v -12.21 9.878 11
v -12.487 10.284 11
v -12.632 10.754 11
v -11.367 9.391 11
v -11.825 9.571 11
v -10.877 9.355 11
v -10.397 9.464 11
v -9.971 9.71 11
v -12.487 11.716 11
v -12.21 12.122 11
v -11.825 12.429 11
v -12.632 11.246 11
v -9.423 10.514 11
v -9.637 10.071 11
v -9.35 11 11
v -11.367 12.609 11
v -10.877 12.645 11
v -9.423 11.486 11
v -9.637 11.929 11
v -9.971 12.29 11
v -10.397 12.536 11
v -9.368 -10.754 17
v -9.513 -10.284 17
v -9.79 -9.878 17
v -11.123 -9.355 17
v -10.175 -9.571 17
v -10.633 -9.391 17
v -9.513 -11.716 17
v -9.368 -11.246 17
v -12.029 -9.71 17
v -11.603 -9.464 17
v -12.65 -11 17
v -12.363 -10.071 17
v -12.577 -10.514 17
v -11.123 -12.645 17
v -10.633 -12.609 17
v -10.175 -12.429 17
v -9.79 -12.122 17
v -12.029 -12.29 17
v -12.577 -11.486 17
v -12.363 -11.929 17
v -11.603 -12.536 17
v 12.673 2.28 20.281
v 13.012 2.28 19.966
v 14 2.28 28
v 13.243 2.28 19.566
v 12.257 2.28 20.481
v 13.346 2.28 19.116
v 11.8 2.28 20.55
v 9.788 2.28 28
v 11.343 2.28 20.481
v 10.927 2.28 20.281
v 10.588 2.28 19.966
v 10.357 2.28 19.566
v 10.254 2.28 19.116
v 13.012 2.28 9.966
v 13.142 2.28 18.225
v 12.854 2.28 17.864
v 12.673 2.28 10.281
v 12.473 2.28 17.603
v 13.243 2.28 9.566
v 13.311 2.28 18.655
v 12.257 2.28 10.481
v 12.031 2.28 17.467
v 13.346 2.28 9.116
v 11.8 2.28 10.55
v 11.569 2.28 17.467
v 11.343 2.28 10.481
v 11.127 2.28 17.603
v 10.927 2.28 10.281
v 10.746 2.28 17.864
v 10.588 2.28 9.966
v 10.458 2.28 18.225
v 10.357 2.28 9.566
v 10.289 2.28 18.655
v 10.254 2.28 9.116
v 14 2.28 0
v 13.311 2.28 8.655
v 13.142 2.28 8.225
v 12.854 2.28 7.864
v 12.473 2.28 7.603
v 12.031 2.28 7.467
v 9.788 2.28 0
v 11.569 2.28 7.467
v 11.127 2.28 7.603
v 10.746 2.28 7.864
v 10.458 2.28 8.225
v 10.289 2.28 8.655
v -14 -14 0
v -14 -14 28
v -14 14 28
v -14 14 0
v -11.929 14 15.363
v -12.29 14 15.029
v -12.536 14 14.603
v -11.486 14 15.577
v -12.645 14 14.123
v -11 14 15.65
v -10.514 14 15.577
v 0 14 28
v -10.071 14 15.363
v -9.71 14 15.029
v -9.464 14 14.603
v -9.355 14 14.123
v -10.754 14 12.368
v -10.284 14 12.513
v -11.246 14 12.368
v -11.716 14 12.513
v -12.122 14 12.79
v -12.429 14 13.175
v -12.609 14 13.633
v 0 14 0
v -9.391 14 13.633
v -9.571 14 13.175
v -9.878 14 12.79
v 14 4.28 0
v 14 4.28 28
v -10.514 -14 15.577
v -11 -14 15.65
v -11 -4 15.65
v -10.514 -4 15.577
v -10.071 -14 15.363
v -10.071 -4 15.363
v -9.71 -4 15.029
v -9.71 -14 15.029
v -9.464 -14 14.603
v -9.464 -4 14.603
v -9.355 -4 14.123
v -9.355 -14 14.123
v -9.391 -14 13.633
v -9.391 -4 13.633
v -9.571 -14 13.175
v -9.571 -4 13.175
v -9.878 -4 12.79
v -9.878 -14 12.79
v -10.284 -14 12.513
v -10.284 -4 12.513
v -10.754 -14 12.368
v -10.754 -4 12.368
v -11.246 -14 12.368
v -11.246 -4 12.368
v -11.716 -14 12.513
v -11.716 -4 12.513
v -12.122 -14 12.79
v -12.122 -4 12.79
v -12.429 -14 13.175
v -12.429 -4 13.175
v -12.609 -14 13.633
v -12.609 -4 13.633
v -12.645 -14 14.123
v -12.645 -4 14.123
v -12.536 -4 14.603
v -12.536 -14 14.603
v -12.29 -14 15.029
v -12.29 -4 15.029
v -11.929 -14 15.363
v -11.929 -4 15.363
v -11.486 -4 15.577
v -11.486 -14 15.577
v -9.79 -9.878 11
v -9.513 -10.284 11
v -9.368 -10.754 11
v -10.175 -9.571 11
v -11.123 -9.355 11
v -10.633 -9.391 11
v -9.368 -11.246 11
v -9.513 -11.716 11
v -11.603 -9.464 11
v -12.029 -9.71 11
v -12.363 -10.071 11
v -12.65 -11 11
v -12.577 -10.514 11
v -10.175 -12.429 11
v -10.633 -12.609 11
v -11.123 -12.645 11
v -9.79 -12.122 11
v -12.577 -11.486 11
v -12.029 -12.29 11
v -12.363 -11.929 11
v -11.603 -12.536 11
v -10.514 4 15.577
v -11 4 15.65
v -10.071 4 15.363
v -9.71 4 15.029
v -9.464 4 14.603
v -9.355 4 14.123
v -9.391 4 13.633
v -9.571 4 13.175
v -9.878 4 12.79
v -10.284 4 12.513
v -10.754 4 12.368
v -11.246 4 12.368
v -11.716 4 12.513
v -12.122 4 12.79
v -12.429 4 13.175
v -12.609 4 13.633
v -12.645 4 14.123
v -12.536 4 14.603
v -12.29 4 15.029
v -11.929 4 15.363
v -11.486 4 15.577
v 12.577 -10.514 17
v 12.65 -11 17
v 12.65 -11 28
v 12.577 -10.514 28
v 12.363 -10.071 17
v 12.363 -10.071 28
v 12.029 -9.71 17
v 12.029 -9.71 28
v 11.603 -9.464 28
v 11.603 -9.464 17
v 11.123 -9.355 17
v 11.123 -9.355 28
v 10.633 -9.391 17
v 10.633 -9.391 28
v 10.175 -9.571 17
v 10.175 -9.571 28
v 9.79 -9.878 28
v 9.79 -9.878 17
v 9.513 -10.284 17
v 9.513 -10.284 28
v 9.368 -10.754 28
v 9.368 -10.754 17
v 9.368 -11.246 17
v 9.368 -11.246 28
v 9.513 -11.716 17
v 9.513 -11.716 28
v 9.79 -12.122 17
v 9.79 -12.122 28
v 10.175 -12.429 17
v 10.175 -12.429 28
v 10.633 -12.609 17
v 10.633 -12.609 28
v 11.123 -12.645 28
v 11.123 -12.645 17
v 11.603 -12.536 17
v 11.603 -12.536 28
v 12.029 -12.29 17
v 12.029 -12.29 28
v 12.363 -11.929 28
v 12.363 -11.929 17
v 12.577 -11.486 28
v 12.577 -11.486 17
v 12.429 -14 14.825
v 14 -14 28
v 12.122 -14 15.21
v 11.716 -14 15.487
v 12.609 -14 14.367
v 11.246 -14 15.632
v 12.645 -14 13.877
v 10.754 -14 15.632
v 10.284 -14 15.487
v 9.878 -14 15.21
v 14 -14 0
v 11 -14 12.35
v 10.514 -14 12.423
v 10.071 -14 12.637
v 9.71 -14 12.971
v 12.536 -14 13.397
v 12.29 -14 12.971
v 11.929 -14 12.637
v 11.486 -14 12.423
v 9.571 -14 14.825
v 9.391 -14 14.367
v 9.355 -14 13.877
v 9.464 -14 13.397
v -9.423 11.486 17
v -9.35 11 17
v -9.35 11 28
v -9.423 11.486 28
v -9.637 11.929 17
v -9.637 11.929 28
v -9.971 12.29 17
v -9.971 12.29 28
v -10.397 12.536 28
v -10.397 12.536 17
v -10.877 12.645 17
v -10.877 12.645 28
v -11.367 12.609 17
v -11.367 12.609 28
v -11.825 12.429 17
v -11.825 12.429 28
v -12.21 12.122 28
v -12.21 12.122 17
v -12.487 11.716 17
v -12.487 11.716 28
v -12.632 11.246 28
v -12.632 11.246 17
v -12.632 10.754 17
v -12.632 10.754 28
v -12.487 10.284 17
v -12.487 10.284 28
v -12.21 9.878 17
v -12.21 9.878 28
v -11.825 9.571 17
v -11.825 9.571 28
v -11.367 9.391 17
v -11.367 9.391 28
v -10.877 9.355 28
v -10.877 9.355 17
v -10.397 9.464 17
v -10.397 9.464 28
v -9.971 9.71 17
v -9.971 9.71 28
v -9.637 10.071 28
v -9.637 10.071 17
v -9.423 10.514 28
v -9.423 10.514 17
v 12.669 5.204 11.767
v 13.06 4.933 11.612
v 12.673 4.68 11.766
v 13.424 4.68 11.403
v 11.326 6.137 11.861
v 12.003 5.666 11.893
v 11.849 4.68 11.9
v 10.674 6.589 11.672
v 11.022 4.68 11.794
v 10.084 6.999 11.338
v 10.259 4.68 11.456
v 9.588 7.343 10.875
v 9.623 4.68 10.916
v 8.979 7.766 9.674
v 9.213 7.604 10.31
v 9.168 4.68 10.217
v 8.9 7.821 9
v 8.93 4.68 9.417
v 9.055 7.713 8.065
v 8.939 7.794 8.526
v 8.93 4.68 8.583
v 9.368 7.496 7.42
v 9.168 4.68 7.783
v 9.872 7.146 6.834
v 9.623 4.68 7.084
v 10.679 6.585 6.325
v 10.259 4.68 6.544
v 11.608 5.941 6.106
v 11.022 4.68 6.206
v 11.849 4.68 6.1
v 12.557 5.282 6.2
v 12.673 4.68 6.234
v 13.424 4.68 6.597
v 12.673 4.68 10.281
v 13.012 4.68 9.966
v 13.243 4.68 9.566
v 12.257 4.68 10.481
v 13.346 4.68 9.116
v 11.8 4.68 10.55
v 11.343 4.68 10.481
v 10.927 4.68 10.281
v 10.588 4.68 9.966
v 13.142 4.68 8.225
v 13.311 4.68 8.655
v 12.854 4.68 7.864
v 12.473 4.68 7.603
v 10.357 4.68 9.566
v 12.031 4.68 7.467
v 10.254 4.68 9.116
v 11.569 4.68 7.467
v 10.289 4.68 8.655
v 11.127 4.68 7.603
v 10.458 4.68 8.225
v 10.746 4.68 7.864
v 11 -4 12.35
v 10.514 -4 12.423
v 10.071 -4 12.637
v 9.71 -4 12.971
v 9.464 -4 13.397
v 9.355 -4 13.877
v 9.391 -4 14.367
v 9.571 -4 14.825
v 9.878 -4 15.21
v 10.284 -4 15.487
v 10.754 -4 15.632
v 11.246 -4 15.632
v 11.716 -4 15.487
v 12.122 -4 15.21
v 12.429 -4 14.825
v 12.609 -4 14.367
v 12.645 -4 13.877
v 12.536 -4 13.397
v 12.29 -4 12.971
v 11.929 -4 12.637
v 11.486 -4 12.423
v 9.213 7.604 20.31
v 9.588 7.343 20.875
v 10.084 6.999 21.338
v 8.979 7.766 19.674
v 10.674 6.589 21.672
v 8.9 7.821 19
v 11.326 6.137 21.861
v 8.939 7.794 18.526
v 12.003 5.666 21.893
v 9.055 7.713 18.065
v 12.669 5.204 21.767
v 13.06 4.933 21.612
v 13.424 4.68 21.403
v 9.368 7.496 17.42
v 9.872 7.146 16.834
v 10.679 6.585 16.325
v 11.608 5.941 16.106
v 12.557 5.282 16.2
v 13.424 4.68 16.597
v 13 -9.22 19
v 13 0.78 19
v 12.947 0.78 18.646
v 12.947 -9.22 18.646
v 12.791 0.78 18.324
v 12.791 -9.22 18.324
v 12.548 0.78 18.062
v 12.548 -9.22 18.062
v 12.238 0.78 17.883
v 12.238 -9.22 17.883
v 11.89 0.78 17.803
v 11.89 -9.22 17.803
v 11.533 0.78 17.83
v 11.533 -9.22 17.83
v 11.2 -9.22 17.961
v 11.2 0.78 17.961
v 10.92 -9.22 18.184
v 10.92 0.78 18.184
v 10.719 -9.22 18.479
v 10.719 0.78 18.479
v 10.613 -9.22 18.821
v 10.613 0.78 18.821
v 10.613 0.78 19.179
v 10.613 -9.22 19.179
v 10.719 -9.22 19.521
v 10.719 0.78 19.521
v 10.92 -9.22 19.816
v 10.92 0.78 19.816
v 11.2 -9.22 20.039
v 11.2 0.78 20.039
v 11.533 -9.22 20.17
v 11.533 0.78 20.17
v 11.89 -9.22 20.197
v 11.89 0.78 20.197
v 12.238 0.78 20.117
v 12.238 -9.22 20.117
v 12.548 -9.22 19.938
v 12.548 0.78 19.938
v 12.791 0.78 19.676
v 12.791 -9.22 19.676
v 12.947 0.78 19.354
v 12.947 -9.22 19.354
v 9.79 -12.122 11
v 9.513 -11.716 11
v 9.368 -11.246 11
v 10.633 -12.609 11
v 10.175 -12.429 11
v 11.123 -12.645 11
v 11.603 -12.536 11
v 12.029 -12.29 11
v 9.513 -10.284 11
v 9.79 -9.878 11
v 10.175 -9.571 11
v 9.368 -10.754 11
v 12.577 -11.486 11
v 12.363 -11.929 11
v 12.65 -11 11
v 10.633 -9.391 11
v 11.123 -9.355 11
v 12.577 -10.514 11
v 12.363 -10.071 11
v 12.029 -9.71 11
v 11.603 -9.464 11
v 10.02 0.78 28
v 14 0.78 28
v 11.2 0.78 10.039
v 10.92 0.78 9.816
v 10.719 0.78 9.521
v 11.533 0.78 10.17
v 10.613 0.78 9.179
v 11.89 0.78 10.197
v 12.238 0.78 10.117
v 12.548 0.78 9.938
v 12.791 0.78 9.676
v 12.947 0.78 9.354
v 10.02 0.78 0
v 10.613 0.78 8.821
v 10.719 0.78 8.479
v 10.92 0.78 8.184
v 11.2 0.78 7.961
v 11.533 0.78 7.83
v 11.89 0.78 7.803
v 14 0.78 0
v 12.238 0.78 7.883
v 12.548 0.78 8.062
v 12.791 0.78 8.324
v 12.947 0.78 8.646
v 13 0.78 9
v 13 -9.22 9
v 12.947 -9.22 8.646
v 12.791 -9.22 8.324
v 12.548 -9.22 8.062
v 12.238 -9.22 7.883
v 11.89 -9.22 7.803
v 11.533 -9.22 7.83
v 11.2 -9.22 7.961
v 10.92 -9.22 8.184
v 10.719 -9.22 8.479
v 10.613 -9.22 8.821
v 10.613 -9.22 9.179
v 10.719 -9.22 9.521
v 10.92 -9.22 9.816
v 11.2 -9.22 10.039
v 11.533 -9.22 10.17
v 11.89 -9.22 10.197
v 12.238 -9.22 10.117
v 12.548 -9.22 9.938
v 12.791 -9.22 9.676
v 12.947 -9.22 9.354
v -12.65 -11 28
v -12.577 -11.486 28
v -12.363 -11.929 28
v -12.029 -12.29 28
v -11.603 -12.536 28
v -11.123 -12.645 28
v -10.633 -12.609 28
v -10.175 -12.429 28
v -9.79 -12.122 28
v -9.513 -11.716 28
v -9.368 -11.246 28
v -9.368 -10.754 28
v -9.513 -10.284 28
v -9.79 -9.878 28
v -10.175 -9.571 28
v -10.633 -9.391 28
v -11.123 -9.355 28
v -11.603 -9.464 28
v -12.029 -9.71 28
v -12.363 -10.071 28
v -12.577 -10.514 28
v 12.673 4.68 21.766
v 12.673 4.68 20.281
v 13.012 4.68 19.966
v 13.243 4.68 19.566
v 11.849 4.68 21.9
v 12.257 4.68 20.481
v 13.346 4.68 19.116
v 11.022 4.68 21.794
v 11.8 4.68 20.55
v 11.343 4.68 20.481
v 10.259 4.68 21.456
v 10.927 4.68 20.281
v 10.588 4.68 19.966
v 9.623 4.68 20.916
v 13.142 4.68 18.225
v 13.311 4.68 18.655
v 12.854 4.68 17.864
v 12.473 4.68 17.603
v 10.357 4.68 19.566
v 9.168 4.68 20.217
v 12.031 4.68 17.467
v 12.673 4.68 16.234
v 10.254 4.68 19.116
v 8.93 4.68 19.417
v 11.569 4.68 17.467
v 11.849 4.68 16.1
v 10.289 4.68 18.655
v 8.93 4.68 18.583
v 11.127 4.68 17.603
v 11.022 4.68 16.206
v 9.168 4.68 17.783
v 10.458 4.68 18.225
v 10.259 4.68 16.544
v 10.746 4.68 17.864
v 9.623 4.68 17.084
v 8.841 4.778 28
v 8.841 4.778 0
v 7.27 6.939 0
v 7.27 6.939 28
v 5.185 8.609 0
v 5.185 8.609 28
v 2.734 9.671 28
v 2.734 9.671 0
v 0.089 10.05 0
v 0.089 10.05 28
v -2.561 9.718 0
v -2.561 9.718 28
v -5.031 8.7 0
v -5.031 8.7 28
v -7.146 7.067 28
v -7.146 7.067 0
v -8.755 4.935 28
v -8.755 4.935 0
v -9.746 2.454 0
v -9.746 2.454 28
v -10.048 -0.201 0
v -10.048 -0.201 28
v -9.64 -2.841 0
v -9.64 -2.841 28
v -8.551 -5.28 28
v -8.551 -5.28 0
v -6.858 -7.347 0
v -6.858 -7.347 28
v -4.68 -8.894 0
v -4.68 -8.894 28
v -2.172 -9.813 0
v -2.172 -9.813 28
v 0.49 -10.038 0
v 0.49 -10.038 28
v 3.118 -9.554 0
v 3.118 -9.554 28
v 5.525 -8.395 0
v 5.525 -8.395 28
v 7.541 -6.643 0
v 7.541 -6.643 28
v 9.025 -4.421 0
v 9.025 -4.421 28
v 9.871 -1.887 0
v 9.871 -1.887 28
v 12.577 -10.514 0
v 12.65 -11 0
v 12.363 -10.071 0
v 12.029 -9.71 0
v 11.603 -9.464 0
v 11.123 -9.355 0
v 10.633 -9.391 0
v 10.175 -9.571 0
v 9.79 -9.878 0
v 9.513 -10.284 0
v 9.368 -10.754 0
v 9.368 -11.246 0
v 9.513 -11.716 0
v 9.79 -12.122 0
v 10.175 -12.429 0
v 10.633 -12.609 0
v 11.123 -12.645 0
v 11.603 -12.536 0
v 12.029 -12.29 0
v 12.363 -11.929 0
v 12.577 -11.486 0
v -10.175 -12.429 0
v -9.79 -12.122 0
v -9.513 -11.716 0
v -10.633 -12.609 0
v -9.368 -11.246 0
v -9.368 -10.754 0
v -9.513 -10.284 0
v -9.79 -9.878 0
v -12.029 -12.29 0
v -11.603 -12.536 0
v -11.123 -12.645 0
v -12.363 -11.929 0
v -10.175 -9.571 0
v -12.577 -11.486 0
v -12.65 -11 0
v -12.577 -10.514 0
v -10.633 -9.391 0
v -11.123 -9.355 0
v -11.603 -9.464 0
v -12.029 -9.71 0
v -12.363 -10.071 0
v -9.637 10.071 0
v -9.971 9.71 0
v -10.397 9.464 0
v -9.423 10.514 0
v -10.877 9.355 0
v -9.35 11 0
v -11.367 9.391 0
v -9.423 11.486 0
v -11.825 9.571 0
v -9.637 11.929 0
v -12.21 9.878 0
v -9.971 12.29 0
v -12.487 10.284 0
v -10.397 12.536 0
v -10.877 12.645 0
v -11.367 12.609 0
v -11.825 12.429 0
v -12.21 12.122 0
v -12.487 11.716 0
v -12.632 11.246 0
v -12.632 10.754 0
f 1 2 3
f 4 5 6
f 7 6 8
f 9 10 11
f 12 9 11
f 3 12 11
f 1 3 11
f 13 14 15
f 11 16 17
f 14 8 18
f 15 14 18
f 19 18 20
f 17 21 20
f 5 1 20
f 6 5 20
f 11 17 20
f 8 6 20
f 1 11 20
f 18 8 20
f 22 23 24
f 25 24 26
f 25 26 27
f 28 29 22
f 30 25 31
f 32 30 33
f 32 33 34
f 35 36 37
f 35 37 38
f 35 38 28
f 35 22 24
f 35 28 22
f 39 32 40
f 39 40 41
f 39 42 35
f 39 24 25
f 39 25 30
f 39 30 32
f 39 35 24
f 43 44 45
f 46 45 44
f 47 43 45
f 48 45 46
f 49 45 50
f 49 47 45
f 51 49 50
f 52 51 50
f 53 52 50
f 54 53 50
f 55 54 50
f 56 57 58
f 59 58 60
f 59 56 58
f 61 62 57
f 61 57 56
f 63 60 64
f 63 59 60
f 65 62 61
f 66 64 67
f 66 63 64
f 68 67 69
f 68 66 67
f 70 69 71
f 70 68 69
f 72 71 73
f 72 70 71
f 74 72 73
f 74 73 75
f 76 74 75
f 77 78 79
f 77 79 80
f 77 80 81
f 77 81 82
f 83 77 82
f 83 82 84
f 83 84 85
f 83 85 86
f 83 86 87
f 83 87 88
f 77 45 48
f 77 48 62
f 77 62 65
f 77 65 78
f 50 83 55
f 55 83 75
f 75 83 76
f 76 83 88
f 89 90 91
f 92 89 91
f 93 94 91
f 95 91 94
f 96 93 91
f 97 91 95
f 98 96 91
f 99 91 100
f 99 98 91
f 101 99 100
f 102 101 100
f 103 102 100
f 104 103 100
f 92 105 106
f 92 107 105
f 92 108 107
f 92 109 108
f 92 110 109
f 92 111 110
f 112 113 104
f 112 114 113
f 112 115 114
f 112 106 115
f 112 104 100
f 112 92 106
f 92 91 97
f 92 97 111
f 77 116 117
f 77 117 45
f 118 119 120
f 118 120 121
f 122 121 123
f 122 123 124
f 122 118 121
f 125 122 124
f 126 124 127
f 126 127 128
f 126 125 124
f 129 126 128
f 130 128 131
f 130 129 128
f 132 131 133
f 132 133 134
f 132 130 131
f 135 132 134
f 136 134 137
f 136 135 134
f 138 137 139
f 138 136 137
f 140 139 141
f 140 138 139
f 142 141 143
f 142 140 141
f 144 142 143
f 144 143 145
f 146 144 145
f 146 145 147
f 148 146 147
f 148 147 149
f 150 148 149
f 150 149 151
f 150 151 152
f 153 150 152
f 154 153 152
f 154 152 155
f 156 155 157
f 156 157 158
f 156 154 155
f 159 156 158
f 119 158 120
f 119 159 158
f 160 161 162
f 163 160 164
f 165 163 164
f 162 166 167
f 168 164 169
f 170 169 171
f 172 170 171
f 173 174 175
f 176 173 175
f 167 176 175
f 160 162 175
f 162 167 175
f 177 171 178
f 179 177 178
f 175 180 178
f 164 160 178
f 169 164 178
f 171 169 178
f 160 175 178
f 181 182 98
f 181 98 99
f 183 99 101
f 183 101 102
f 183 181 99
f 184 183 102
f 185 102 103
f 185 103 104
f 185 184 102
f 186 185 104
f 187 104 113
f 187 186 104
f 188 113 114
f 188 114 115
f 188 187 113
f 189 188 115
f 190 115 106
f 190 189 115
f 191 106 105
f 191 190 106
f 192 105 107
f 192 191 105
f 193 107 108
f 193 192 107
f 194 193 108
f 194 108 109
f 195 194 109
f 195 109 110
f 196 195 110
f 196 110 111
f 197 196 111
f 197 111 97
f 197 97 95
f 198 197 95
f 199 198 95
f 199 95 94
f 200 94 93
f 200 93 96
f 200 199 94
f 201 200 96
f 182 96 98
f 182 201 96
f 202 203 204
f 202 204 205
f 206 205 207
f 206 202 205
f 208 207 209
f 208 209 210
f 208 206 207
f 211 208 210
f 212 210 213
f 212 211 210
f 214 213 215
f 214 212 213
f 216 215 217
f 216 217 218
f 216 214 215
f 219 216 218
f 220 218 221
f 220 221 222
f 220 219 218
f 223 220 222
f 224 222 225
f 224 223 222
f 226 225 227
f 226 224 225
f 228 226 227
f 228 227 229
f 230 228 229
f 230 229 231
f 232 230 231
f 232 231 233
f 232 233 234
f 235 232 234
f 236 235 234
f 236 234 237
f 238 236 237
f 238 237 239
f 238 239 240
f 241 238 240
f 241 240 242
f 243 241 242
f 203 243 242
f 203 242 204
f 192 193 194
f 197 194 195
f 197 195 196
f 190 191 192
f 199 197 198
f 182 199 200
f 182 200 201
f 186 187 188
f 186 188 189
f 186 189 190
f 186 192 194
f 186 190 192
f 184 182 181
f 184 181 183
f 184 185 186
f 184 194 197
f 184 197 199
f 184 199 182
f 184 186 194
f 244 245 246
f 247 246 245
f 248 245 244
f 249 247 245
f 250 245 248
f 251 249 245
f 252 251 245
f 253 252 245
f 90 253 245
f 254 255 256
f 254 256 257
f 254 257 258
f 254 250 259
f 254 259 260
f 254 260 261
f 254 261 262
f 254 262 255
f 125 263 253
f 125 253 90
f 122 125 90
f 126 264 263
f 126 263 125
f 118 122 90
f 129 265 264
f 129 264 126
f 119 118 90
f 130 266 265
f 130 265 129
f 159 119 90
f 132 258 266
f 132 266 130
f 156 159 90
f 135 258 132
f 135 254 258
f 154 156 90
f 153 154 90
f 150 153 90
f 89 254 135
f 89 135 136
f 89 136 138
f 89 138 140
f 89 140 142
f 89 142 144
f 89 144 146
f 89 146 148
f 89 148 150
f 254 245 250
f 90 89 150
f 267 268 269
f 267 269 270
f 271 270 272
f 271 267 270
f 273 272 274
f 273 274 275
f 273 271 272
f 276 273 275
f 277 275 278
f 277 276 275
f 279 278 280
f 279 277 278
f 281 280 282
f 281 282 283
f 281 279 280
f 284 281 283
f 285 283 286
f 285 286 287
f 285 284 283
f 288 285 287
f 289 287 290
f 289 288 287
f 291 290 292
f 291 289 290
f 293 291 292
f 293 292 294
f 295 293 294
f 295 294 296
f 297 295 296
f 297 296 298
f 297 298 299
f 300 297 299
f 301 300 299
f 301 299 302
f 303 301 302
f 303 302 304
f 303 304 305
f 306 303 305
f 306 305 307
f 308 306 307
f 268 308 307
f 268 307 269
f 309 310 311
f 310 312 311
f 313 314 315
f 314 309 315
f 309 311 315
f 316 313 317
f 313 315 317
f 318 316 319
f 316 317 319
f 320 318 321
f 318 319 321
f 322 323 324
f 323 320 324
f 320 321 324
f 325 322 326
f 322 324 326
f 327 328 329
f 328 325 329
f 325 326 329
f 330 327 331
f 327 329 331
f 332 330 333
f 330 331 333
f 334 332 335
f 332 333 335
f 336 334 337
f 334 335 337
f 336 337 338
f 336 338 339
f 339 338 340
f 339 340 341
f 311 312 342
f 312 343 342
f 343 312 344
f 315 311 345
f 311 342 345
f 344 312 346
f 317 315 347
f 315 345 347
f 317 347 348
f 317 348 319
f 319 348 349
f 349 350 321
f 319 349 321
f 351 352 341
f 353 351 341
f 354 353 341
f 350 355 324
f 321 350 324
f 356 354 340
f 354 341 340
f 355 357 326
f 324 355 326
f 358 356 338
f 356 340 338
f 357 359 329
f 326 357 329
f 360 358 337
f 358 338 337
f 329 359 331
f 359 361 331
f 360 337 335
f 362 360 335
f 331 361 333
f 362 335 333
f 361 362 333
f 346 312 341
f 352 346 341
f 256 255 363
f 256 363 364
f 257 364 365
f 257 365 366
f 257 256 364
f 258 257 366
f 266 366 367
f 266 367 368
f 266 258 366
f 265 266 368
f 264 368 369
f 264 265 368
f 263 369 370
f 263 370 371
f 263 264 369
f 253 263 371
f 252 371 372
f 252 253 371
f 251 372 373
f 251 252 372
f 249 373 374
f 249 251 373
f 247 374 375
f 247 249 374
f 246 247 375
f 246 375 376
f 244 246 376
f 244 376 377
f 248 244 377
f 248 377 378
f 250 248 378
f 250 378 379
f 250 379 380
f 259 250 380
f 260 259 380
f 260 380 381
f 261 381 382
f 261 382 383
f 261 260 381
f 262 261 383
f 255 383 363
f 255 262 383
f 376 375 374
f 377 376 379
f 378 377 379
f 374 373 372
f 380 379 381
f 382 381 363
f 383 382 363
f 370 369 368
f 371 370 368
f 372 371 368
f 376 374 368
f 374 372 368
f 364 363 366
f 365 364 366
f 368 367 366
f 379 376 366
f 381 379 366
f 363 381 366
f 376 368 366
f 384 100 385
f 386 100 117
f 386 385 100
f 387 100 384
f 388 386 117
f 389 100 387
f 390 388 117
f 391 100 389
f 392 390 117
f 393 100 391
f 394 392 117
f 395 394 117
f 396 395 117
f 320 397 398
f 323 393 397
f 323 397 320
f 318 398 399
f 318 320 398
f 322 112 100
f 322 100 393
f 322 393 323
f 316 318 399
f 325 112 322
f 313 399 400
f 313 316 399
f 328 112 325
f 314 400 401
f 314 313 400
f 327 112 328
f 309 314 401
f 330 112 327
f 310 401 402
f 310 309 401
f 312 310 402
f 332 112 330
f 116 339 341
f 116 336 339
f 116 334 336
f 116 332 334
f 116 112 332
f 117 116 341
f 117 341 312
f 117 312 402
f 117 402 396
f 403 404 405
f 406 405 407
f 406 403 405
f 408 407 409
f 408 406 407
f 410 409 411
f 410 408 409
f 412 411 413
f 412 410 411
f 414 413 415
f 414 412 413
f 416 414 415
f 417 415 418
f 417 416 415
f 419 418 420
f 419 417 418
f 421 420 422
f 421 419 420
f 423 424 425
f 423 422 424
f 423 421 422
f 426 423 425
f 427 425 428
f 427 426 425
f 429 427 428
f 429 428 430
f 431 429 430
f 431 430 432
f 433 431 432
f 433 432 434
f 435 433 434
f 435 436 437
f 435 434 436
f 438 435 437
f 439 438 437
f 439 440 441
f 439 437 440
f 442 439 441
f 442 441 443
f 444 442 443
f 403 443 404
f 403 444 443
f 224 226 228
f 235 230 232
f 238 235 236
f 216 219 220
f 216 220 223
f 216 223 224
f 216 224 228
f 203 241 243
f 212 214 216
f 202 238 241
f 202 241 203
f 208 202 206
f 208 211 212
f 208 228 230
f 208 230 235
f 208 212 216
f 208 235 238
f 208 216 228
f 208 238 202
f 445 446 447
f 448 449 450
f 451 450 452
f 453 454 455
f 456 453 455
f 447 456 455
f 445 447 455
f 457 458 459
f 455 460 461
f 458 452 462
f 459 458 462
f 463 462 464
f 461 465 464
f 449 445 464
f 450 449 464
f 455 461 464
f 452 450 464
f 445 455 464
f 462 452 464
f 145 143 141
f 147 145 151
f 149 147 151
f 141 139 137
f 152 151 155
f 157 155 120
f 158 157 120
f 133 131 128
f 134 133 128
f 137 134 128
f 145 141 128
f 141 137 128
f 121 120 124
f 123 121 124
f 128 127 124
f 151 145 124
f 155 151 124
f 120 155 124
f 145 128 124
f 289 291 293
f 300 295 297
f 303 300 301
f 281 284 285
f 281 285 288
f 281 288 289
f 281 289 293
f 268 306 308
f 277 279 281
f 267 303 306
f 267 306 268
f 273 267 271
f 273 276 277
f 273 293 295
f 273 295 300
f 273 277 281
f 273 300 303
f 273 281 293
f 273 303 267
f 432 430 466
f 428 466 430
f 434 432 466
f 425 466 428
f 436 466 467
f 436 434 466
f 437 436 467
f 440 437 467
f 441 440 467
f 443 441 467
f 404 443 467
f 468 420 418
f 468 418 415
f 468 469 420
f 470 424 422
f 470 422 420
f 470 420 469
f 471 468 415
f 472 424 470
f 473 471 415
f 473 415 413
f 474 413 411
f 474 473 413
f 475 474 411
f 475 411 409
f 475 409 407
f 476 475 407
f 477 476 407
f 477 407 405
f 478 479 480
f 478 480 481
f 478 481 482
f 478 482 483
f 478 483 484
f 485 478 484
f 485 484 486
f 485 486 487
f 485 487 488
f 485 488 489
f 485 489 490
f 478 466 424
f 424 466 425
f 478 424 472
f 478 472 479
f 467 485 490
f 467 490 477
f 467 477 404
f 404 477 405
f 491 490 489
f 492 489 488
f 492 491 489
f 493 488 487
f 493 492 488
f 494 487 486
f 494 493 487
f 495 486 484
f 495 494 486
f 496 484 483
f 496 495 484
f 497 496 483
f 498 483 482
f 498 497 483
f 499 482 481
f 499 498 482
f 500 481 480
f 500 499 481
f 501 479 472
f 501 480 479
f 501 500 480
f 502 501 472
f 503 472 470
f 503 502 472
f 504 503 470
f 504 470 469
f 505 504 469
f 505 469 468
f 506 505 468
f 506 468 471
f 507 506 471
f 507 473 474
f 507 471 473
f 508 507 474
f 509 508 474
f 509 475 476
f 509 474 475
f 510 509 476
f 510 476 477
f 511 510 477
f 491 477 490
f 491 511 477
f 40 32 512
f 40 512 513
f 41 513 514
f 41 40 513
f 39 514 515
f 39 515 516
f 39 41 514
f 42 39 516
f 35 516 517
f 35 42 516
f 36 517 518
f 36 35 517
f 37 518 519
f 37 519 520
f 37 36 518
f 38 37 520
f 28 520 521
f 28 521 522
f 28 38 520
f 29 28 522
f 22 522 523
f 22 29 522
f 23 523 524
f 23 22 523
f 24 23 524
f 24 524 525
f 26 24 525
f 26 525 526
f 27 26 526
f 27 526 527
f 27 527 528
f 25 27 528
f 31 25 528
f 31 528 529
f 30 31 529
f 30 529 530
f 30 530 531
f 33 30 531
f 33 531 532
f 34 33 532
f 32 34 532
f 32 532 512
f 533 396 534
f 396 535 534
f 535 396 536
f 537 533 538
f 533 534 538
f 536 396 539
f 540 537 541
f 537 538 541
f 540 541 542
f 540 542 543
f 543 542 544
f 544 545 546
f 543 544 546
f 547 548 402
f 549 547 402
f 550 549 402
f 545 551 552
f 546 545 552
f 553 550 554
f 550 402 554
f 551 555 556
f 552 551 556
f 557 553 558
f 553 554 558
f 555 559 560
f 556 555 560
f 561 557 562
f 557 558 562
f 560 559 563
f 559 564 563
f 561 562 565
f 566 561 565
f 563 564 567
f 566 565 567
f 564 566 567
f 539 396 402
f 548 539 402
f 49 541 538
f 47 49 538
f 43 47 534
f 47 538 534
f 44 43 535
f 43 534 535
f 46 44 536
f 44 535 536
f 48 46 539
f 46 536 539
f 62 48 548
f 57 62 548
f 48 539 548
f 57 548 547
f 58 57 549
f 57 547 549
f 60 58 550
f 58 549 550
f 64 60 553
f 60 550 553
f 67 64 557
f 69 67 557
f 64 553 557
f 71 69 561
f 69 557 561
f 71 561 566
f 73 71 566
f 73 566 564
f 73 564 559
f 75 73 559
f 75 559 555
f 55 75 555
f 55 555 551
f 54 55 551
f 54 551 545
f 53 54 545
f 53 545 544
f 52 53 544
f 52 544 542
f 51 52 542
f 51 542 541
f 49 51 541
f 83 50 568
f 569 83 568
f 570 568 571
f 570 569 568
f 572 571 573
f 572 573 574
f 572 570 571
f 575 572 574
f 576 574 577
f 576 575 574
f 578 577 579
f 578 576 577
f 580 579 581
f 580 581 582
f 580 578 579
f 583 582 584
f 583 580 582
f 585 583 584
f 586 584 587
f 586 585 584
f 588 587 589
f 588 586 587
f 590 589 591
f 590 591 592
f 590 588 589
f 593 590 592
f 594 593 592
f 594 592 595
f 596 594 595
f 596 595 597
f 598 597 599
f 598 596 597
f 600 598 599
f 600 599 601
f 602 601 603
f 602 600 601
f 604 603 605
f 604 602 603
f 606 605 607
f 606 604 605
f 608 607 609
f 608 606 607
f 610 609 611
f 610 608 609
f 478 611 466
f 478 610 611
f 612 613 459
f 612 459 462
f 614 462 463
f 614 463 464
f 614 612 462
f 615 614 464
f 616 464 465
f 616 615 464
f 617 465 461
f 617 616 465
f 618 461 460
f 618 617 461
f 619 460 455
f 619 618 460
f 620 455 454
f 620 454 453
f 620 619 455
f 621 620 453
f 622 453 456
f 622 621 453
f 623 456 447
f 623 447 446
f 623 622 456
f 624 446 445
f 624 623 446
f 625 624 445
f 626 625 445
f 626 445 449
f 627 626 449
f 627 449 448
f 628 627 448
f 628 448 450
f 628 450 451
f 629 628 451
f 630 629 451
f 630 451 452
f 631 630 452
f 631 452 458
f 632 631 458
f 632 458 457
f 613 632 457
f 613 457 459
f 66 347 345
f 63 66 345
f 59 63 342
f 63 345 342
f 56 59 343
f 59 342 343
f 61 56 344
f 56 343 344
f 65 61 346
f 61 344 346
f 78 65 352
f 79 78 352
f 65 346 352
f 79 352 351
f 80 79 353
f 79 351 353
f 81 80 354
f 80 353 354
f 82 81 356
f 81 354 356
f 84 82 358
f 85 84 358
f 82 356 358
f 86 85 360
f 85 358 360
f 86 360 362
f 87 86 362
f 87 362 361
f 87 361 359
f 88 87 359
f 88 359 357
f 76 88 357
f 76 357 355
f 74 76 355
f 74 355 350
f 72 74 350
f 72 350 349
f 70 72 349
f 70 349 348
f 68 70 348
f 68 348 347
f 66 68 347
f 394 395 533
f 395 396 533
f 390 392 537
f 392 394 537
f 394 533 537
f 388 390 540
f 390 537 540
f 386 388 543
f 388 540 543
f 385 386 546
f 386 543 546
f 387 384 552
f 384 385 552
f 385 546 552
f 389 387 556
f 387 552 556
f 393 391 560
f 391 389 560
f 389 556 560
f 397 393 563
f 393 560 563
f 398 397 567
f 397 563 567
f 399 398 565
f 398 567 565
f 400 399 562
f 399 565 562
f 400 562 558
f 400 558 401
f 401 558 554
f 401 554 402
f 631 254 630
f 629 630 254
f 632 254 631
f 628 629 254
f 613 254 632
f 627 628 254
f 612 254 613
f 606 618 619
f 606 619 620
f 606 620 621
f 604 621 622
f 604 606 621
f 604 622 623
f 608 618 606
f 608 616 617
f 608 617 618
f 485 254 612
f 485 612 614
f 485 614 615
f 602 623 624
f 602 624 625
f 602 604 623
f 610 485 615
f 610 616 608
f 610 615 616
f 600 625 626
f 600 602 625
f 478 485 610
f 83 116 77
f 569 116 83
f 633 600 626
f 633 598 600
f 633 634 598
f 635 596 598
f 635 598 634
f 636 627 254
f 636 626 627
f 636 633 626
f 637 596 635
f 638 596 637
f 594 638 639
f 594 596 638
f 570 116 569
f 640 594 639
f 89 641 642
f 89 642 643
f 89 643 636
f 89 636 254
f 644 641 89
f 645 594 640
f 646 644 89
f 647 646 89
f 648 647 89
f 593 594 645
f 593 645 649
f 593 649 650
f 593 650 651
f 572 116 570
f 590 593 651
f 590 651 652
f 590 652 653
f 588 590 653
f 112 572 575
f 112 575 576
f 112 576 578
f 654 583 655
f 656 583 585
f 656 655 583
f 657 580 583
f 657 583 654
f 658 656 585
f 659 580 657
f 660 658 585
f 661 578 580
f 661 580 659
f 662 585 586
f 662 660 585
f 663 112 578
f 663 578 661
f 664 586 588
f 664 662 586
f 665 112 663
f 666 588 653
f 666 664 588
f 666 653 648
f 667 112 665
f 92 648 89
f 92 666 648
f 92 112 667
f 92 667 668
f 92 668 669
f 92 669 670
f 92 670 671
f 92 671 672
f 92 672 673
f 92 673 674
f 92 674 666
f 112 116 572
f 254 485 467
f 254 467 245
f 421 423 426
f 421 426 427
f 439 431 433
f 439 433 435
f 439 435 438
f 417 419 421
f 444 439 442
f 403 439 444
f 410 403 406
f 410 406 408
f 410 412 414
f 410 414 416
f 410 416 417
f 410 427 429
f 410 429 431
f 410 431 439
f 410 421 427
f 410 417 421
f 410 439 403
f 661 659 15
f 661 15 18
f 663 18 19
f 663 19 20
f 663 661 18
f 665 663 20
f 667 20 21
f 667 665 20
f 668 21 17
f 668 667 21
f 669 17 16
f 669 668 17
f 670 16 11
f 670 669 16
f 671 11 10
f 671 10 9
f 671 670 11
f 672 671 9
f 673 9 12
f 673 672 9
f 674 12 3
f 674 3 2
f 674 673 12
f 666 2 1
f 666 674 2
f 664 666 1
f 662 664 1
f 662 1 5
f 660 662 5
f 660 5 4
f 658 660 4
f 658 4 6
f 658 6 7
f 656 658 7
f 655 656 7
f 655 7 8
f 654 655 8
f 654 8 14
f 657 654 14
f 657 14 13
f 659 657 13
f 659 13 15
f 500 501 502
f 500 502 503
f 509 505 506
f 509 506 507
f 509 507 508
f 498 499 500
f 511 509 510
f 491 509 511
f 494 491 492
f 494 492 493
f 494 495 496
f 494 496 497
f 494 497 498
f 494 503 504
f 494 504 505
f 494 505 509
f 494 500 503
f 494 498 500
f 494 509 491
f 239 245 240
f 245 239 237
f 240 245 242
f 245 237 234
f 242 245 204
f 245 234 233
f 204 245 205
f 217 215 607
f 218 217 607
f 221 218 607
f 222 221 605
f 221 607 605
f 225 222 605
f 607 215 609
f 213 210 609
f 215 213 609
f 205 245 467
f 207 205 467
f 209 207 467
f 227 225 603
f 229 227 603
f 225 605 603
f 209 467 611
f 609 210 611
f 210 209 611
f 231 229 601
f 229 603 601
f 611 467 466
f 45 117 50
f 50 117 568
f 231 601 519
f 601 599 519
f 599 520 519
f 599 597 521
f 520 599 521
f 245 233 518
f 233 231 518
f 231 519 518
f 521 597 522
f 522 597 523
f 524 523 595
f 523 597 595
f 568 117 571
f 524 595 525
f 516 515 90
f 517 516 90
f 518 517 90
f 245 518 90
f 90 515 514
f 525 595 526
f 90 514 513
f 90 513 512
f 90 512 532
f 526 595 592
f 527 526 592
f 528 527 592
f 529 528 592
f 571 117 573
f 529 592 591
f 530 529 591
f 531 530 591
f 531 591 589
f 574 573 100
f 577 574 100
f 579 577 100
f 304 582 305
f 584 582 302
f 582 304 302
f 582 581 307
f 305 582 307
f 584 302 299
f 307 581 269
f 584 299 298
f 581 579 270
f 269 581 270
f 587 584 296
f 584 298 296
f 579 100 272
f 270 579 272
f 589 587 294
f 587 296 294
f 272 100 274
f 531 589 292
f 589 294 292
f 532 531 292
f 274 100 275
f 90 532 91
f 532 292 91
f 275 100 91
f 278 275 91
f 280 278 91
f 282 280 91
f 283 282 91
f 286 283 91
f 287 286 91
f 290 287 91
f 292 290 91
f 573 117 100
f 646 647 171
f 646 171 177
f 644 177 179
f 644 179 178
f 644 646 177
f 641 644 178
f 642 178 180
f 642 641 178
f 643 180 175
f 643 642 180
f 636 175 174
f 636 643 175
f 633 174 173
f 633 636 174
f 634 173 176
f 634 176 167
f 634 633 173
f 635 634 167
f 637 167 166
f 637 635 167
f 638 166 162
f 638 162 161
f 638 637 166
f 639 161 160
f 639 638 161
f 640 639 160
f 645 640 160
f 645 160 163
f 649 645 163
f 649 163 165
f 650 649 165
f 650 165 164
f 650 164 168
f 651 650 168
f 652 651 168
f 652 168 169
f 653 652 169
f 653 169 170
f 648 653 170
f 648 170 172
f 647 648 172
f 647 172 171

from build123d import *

# Parameters (mm, degrees)
ESQUISSE1_R                  = 1.65
BOSS_EXTRU_1_DEPTH           = 28
ENL_V_START                  = -2.4
ESQUISSE6_R                  = 2.9
ENL_V_MAT_EXTRU_3_DEPTH      = 33.885060109
ESQUISSE7_R                  = 1.55
ENL_V_MAT_EXTRU_4_DEPTH      = 3.9
ENL_V_MAT_EXTRU_5_DEPTH      = 35.618575031
ENL_V_MAT_EXTRU_5_DEPTH_BACK = 10
ESQUISSE8_R                  = 1.2
BOSS_EXTRU_6_START           = -17
ESQUISSE10_R                 = 1.65
BOSS_EXTRU_6_DEPTH           = 6
ESQUISSE11_R                 = 1.65
ENL_V_MAT_EXTRU_6_DEPTH      = 10
ENL_V_START_2                = -10
ESQUISSE12_R                 = 1.65
ENL_V_MAT_EXTRU_7_DEPTH      = 10


with BuildPart() as part:
    # Esquisse1 → Boss.-Extru.1 (new body)
    with BuildSketch(Plane.XY):
        with BuildLine():
            Line((0, 14), (14, 4.279909917))
            Line((14, 4.279909917), (14, 2.279909917))
            Line((14, 2.279909917), (9.787977869, 2.279909917))
            ThreePointArc((9.787977869, 2.279909917), (-9.932192744, -1.534290483), (10.019692636, 0.779909917))
            Line((10.019692636, 0.779909917), (14, 0.779909917))
            Line((14, 0.779909917), (14, -14))
            Line((14, -14), (-14, -14))
            Line((-14, -14), (-14, 14))
            Line((-14, 14), (0, 14))
        make_face()
        with Locations((-11, 11)):
            Circle(ESQUISSE1_R, mode=Mode.SUBTRACT)
        with Locations(Location((-11, -11, 0), (0, 0, 180))):
            Circle(ESQUISSE1_R, mode=Mode.SUBTRACT)
        with Locations((11, -11)):
            Circle(ESQUISSE1_R, mode=Mode.SUBTRACT)
    extrude(amount=BOSS_EXTRU_1_DEPTH)

    # Esquisse6 → Enlèv. mat.-Extru.3 (cut, through all)
    with BuildSketch(Plane(origin=(0, 2.279909917, 0), x_dir=(-1, 0, 0), z_dir=(0, -1, 0)).offset(ENL_V_START)):
        with Locations((-11.8, -9)):
            Circle(ESQUISSE6_R)
        with Locations((-11.8, -19)):
            Circle(ESQUISSE6_R)
    extrude(amount=-ENL_V_MAT_EXTRU_3_DEPTH, mode=Mode.SUBTRACT)

    # Esquisse7 → Enlèv. mat.-Extru.4 (cut)
    with BuildSketch(Plane(origin=(0, 4.679909917, 0), x_dir=(1, 0, 0), z_dir=(0, 1, 0))):
        with Locations(Location((11.8, -9, 0), (0, 0, 270))):
            Circle(ESQUISSE7_R)
        with Locations(Location((11.8, -19, 0), (0, 0, 270))):
            Circle(ESQUISSE7_R)
    extrude(amount=-ENL_V_MAT_EXTRU_4_DEPTH, mode=Mode.SUBTRACT)

    # Esquisse8 → Enlèv. mat.-Extru.5 (cut, two sides: drawn at the far end of the back side and taken through both)
    with BuildSketch(Plane(origin=(0, 0.779909917, 0), x_dir=(1, 0, 0), z_dir=(0, 1, 0)).offset(-ENL_V_MAT_EXTRU_5_DEPTH_BACK)):
        with Locations((11.8, -9)):
            Circle(ESQUISSE8_R)
        with Locations((11.8, -19)):
            Circle(ESQUISSE8_R)
    extrude(amount=ENL_V_MAT_EXTRU_5_DEPTH + ENL_V_MAT_EXTRU_5_DEPTH_BACK, mode=Mode.SUBTRACT)

    # Esquisse10 → Boss.-Extru.6 (add)
    with BuildSketch(Plane.XY.offset(28).offset(BOSS_EXTRU_6_START)):
        with Locations(Location((-11, -11, 0), (0, 0, 180))):
            Circle(ESQUISSE10_R)
        with Locations((11, -11)):
            Circle(ESQUISSE10_R)
        with Locations((-11, 11)):
            Circle(ESQUISSE10_R)
    extrude(amount=BOSS_EXTRU_6_DEPTH)

    # Esquisse11 → Enlèv. mat.-Extru.6 (cut)
    with BuildSketch(Plane(origin=(0, -14, 0), x_dir=(1, 0, 0), z_dir=(0, 1, 0))):
        with Locations(Location((-11, -14, 0), (0, 0, 270))):
            Circle(ESQUISSE11_R)
        with Locations(Location((11, -14, 0), (0, 0, 90))):
            Circle(ESQUISSE11_R)
    extrude(amount=ENL_V_MAT_EXTRU_6_DEPTH, mode=Mode.SUBTRACT)

    # Esquisse12 → Enlèv. mat.-Extru.7 (cut)
    with BuildSketch(Plane(origin=(0, 14, 0), x_dir=(1, 0, 0), z_dir=(0, 1, 0)).offset(ENL_V_START_2)):
        with Locations(Location((-11, -14, 0), (0, 0, 270))):
            Circle(ESQUISSE12_R)
    extrude(amount=ENL_V_MAT_EXTRU_7_DEPTH, mode=Mode.SUBTRACT)


solid = part.part
